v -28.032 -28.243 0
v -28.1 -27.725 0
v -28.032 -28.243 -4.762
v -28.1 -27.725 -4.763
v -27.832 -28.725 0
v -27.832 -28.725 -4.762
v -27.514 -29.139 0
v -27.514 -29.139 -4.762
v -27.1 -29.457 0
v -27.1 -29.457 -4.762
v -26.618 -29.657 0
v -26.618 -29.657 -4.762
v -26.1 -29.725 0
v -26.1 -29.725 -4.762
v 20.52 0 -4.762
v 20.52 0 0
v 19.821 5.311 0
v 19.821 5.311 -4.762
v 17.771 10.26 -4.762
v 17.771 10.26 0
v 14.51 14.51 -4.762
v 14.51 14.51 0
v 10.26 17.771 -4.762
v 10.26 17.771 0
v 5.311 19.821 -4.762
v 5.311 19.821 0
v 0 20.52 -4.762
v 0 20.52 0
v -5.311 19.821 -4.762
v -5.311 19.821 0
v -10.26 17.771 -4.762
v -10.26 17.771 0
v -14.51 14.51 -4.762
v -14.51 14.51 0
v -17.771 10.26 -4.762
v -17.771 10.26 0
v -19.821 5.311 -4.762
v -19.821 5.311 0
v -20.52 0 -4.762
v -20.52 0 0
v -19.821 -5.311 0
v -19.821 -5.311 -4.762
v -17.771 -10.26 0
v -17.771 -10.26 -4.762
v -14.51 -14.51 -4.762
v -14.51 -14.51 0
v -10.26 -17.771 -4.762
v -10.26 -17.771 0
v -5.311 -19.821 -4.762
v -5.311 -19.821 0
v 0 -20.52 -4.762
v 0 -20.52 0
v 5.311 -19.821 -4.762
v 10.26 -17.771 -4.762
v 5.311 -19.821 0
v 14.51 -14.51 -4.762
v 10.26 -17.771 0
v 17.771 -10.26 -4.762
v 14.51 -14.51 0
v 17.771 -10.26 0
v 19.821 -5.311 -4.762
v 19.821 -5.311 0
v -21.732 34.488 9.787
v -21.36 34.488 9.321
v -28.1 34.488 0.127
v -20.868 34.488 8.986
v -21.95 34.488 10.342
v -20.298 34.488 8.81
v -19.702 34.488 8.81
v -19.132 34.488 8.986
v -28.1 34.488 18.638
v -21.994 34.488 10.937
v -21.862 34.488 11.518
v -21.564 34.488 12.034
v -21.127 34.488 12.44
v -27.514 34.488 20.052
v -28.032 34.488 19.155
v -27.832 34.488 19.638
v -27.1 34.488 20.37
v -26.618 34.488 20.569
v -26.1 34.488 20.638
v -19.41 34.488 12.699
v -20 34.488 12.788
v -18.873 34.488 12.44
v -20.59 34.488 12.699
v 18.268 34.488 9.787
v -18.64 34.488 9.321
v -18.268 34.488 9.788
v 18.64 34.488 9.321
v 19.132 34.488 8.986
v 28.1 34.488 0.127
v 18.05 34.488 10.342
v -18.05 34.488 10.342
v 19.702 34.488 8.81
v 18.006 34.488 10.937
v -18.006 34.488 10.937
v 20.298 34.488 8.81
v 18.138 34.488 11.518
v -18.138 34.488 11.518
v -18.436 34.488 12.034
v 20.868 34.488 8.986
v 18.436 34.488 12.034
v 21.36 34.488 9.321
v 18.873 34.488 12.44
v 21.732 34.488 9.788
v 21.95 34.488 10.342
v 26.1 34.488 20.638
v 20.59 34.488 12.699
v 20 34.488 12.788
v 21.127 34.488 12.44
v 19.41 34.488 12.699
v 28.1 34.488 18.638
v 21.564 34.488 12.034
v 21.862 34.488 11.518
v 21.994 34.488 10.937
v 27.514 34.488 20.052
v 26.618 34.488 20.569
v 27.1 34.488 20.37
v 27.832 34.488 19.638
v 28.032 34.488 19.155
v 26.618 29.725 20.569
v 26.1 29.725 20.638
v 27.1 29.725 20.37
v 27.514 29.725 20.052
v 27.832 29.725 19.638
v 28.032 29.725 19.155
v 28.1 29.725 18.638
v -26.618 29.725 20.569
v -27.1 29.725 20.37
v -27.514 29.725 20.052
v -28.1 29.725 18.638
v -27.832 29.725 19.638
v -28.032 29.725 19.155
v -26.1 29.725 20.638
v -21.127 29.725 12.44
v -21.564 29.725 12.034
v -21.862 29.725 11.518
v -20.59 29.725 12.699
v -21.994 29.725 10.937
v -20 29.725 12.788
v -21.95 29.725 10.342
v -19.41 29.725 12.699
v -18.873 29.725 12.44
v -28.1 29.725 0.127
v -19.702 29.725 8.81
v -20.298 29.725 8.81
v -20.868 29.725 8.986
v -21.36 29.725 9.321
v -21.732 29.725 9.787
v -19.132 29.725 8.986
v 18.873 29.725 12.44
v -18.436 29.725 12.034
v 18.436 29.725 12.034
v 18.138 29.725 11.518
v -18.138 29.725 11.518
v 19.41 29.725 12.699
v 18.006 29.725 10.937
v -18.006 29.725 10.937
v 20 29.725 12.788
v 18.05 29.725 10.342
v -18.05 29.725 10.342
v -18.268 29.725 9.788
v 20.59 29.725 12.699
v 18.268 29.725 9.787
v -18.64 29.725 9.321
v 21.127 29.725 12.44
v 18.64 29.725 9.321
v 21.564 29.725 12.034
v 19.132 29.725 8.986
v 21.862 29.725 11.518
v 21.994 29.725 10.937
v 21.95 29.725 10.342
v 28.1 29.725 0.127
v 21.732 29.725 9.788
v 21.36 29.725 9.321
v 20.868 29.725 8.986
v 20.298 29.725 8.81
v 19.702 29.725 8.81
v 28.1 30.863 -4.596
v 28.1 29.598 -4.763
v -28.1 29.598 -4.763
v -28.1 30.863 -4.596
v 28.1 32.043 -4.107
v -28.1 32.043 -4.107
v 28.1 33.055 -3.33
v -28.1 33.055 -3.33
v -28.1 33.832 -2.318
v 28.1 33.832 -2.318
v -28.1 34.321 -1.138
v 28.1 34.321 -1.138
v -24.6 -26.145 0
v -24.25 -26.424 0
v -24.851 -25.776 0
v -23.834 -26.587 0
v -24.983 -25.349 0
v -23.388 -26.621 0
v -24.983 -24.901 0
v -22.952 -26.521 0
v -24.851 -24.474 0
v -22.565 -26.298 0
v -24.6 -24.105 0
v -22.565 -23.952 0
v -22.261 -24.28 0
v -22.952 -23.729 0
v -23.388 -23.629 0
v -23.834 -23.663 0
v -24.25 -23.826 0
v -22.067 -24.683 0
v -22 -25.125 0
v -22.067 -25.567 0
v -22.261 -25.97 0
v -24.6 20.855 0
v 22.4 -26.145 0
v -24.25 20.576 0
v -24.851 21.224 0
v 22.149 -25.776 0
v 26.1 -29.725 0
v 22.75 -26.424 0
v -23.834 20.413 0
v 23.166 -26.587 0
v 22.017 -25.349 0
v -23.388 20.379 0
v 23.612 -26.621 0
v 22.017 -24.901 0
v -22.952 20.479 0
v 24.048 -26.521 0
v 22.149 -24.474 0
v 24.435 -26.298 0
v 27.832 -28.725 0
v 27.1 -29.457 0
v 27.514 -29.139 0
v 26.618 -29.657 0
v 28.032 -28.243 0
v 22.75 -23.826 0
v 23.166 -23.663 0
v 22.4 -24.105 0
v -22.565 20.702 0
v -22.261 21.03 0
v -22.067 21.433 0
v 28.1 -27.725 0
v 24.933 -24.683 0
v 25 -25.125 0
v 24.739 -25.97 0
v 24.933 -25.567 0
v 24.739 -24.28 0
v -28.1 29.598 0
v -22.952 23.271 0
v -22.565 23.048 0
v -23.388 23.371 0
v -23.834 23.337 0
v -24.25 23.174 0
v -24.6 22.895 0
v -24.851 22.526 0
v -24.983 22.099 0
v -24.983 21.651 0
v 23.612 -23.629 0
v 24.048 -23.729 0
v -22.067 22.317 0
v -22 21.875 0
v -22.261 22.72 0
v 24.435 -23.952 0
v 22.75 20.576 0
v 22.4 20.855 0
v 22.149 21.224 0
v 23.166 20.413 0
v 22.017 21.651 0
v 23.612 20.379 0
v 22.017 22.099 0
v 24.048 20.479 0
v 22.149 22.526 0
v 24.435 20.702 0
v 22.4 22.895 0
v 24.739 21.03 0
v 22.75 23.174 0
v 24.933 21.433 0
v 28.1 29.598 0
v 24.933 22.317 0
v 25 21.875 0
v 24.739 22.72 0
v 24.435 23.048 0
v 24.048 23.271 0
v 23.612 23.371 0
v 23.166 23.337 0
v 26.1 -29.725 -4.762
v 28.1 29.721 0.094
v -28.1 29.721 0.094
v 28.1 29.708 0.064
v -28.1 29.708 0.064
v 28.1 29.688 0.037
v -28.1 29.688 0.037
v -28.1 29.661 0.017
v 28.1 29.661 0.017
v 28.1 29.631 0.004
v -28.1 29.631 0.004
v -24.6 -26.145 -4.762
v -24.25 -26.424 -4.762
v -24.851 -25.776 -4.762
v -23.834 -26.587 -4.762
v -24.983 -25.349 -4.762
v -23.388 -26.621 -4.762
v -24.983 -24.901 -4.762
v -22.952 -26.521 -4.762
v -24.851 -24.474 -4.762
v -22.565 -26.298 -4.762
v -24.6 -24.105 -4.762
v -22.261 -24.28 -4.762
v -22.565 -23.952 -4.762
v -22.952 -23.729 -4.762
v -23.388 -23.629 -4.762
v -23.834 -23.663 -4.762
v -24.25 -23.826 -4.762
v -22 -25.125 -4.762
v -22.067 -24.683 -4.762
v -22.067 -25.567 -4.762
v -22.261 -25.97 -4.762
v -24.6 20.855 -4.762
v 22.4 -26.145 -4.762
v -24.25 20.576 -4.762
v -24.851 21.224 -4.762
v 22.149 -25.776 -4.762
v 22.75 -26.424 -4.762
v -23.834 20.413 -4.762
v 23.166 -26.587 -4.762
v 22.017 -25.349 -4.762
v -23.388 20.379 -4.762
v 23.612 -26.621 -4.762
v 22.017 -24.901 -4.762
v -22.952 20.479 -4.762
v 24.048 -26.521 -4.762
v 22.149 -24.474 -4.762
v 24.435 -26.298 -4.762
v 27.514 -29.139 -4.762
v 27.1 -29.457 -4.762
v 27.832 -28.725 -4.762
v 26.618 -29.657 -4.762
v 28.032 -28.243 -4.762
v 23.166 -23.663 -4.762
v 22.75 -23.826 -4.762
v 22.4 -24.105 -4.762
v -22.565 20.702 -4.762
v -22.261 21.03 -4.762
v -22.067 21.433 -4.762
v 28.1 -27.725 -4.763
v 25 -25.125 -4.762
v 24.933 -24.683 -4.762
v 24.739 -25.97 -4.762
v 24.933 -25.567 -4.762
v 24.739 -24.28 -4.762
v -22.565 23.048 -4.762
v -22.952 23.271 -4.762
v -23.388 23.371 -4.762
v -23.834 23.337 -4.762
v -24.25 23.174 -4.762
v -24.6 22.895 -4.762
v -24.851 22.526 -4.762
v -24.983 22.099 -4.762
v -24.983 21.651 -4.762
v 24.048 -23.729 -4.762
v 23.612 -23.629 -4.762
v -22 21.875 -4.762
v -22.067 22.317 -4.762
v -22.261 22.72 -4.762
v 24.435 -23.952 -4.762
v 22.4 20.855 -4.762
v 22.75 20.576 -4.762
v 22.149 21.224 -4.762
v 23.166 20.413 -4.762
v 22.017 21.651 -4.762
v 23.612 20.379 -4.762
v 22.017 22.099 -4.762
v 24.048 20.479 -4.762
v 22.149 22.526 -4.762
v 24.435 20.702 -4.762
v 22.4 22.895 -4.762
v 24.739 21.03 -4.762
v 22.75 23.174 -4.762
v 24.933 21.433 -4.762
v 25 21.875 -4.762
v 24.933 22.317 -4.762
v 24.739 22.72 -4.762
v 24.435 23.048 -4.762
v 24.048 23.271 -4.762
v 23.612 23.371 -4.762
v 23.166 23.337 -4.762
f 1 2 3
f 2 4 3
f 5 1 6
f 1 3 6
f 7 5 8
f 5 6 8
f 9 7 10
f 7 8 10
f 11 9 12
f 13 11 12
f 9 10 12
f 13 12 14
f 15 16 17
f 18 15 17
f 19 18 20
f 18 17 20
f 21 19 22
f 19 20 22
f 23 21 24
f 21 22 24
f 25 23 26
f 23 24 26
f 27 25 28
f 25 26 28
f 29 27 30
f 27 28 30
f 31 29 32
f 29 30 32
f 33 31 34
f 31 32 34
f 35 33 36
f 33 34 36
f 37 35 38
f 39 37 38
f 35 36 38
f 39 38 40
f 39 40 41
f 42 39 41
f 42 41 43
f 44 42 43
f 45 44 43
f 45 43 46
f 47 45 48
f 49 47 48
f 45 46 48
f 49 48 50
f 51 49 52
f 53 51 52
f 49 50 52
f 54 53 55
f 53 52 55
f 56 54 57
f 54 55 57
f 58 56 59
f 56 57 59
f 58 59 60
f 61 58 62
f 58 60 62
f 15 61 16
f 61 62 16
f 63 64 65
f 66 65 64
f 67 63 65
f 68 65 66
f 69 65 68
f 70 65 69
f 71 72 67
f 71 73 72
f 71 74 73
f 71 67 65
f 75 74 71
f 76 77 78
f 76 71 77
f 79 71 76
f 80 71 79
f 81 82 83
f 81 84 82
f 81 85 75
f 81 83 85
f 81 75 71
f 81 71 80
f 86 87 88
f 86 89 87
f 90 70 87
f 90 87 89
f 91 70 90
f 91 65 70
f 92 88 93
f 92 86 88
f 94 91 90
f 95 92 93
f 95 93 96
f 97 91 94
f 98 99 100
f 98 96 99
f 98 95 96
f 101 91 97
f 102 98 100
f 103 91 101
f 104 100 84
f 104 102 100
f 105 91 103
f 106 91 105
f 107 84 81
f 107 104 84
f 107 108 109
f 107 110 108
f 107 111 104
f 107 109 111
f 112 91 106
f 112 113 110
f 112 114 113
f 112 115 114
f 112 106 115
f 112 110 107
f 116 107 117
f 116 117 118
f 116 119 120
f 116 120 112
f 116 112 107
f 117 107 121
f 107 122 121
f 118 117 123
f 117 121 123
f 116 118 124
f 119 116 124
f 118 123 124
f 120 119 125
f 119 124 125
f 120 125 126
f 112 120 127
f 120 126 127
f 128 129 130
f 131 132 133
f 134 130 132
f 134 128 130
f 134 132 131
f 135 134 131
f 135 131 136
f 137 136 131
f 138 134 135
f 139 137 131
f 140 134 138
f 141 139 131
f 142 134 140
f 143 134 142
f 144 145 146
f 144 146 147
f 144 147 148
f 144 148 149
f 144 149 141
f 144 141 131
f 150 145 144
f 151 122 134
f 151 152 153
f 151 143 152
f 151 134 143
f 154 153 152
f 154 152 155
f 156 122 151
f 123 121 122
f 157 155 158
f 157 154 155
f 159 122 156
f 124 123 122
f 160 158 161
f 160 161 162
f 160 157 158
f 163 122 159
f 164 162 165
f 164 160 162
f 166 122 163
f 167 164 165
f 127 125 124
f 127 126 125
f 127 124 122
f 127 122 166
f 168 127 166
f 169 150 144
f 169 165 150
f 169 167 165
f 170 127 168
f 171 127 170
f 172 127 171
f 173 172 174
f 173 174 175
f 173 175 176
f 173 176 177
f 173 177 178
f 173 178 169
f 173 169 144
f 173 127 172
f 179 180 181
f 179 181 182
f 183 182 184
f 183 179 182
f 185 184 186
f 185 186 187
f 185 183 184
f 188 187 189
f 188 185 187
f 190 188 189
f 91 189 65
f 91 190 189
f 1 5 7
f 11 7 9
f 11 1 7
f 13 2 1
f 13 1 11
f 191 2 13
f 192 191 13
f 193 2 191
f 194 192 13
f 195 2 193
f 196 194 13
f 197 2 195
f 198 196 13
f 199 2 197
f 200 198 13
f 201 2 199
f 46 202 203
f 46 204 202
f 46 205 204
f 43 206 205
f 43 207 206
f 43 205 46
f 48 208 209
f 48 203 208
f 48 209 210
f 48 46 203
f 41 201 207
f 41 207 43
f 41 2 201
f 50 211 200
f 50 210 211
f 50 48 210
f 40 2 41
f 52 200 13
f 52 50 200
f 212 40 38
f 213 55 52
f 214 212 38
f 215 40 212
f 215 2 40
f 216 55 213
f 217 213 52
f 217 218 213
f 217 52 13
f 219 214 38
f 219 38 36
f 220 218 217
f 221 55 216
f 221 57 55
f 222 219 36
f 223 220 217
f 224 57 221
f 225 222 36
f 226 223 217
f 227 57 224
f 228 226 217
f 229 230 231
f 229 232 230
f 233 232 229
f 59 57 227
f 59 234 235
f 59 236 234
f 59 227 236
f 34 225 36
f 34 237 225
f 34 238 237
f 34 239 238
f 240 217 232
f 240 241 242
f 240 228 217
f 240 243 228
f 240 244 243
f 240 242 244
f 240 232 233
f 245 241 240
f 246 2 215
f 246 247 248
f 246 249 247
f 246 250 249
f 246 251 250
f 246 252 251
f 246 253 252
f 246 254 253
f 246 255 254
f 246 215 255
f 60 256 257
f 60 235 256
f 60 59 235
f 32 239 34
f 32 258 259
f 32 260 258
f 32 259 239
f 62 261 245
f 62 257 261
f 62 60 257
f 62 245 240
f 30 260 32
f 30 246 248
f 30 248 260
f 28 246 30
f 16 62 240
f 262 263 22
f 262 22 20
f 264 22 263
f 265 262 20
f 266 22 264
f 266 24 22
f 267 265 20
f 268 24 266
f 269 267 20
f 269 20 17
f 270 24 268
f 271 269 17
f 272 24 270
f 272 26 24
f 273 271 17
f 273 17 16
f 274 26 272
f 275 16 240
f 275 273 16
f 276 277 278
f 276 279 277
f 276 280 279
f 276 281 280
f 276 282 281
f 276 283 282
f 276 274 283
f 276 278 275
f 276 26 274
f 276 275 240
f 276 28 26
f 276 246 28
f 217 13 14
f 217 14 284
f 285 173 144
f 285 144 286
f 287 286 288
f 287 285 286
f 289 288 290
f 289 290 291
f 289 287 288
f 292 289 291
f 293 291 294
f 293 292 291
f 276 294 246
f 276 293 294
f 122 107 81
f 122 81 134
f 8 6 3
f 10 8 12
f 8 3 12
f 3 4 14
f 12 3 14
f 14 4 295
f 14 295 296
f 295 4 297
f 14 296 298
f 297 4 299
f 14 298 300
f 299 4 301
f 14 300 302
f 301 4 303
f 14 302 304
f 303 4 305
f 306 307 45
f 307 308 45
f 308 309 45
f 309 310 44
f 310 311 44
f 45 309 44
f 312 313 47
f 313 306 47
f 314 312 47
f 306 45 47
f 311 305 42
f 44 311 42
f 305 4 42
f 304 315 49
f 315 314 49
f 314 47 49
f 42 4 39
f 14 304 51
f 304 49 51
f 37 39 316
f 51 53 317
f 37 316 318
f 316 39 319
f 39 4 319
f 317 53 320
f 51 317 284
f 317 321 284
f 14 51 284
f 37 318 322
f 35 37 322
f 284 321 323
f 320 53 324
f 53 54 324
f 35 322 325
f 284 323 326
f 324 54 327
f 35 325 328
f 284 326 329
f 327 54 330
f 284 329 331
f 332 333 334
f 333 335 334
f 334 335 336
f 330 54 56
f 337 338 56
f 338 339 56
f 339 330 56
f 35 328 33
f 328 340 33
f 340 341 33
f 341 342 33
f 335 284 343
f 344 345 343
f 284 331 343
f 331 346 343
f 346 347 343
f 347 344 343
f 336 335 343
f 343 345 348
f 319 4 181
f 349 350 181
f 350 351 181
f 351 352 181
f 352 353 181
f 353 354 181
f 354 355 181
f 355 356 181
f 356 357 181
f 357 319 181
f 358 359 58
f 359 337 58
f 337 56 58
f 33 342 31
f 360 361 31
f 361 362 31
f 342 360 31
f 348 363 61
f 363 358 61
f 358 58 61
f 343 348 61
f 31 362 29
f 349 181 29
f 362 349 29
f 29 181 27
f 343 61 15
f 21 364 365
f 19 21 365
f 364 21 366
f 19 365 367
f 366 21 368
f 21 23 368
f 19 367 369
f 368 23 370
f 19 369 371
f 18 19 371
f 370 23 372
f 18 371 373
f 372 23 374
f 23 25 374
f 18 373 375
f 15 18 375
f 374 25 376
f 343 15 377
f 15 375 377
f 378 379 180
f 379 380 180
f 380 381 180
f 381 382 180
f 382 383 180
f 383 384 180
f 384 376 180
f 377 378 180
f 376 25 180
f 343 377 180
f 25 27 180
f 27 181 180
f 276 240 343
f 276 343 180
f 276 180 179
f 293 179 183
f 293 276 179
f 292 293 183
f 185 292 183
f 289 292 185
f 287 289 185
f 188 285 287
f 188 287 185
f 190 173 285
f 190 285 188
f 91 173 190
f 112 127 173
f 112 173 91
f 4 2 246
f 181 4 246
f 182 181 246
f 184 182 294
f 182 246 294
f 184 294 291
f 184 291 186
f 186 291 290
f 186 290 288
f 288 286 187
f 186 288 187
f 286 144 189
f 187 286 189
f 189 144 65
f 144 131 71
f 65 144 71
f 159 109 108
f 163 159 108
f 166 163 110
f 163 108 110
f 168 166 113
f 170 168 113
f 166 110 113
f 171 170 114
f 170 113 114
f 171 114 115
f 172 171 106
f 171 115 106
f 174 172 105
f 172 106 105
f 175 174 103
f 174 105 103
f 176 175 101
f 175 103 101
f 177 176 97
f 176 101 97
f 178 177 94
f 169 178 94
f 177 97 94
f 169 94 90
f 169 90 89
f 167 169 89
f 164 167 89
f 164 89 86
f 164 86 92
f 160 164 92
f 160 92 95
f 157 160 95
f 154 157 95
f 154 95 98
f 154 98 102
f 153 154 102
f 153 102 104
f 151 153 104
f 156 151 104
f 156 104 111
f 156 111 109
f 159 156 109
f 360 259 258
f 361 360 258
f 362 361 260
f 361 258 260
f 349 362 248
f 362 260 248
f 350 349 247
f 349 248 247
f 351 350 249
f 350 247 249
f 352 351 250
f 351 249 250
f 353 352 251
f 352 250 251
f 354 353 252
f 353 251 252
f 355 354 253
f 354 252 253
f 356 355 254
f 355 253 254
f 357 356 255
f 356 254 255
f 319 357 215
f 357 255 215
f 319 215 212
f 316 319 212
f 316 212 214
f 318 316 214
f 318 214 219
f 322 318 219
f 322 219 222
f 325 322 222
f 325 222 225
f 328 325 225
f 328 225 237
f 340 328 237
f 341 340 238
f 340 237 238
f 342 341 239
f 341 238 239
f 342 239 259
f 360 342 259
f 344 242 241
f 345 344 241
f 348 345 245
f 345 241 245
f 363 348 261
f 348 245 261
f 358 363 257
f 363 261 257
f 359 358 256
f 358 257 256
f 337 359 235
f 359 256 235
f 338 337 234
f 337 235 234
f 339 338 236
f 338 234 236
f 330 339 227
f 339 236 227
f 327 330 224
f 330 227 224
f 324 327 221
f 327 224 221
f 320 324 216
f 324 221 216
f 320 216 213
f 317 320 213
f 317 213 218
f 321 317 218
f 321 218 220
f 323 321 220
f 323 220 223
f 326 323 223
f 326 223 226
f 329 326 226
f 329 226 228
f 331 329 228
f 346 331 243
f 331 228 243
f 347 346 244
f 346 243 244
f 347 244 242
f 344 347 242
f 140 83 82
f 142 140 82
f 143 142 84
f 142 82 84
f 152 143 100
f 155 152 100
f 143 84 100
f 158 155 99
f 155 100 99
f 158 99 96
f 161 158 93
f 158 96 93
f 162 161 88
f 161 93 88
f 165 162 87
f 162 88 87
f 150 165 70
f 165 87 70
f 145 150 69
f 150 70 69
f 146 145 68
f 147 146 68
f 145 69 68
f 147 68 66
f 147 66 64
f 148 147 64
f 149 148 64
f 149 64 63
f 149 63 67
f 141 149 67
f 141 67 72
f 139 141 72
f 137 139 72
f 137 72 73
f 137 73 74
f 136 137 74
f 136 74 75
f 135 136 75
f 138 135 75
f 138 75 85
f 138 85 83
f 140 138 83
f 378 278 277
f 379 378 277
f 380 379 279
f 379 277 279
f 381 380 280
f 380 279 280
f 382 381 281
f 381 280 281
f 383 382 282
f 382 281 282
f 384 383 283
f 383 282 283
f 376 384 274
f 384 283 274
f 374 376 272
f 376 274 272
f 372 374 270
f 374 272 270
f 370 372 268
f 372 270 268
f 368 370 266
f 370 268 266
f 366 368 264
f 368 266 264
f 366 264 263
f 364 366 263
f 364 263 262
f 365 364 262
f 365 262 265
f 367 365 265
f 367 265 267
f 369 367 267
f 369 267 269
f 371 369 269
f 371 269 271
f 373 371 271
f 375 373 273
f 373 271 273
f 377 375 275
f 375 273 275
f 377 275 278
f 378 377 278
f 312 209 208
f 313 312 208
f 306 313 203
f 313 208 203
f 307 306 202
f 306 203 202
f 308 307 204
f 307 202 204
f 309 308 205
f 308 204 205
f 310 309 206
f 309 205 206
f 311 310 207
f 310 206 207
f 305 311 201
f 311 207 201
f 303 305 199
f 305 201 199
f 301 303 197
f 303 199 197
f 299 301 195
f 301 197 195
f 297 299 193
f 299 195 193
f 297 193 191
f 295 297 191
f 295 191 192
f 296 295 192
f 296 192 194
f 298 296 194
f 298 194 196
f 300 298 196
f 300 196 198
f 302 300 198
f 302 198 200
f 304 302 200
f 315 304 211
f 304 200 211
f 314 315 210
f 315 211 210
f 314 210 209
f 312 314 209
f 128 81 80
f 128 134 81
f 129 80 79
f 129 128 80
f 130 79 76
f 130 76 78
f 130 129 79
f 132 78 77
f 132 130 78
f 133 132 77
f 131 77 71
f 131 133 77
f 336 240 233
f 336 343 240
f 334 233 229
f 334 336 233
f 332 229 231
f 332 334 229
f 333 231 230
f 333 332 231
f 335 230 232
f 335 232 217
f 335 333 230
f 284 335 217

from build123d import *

# Parameters (mm, degrees)
SKETCH1_W                    = 56.2
SKETCH1_H                    = 59.45
SKETCH1_R                    = 20.52
SKETCH1_R_2                  = 1.5
BASE_FLANGE1_DEPTH           = 4.7625
EDGE_FLANGE1_STRIP_W         = 19.304
EDGE_FLANGE1_STRIP_H         = 4.7625
EDGE_FLANGE1_STRIP_CUT_DEPTH = 56.2
EDGE_FLANGE1_DEPTH           = 56.2
FILLET1_R                    = 2
CUT_EXTRUDE1_REACH           = 75.067
SKETCH11_R                   = 2


# Sheet-metal steps are written as plain solids
with BuildPart() as part:
    # Sketch1 → Base-Flange1 (new body)
    with BuildSketch(Plane.XY):
        Rectangle(SKETCH1_W, SKETCH1_H)
        Circle(SKETCH1_R, mode=Mode.SUBTRACT)
        with Locations((-23.5, 21.874999952)):
            Circle(SKETCH1_R_2, mode=Mode.SUBTRACT)
        with Locations((23.5, 21.874999952)):
            Circle(SKETCH1_R_2, mode=Mode.SUBTRACT)
        with Locations((-23.5, -25.125)):
            Circle(SKETCH1_R_2, mode=Mode.SUBTRACT)
        with Locations((23.5, -25.125)):
            Circle(SKETCH1_R_2, mode=Mode.SUBTRACT)
    extrude(amount=-BASE_FLANGE1_DEPTH)

    # Edge-Flange1 strip (across the edge) → Edge-Flange1 strip cut (cut)
    with BuildSketch(Plane(origin=(28.1, 29.725, 0), x_dir=(0, -1, 0), z_dir=(-1, 0, 0))):
        with Locations((-9.525, -2.38125)):
            Rectangle(EDGE_FLANGE1_STRIP_W, EDGE_FLANGE1_STRIP_H)
    extrude(amount=EDGE_FLANGE1_STRIP_CUT_DEPTH, mode=Mode.SUBTRACT)

    # Edge-Flange1 section (across the edge) → Edge-Flange1 (add)
    with BuildSketch(Plane(origin=(28.1, 29.725, 0), x_dir=(0, -1, 0), z_dir=(-1, 0, 0))):
        with BuildLine():
            Line((-4.7625, 0.127), (-4.7625, 20.6375))
            Line((-4.7625, 20.6375), (0, 20.6375))
            Line((0, 20.6375), (0, 0.127))
            ThreePointArc((0, 0.127), (0.037197439, 0.037197439), (0.127, 0))
            Line((0.127, 0), (0.127, -4.7625))
            ThreePointArc((0.127, -4.7625), (-3.330398607, -3.330398607), (-4.7625, 0.127))
        make_face()
    extrude(amount=EDGE_FLANGE1_DEPTH)

    # Fillet1
    fillet1_edges = [part.edges().sort_by_distance(p)[0] for p in [
        (28.1, 32.10625, 20.6375),
        (-28.1, 32.10625, 20.6375),
        (28.1, -29.725, -2.38125),
        (-28.1, -29.725, -2.38125),
    ]]
    fillet(fillet1_edges, radius=FILLET1_R)

    # Sketch11 → Cut-Extrude1 (cut, up to next)
    with BuildSketch(Plane(origin=(0, 34.4875, 0), x_dir=(1, 0, 0), z_dir=(0, 1, 0)), mode=Mode.PRIVATE) as cut_extrude1_sk1:
        with Locations(Location((-20, -10.7875, 0), (0, 0, 270))):
            Circle(SKETCH11_R)
    cut_extrude1_tool1 = extrude(cut_extrude1_sk1.sketch, amount=-CUT_EXTRUDE1_REACH, mode=Mode.PRIVATE) & part.part
    # Sketch11 → Cut-Extrude1 (cut, up to next)
    with BuildSketch(Plane(origin=(0, 34.4875, 0), x_dir=(1, 0, 0), z_dir=(0, 1, 0)), mode=Mode.PRIVATE) as cut_extrude1_sk2:
        with Locations(Location((20, -10.7875, 0), (0, 0, 270))):
            Circle(SKETCH11_R)
    cut_extrude1_tool2 = extrude(cut_extrude1_sk2.sketch, amount=-CUT_EXTRUDE1_REACH, mode=Mode.PRIVATE) & part.part
    add(cut_extrude1_tool1.solids().sort_by_distance((-20, 34.4875, 10.7875))[0], mode=Mode.SUBTRACT)
    add(cut_extrude1_tool2.solids().sort_by_distance((20, 34.4875, 10.7875))[0], mode=Mode.SUBTRACT)


solid = part.part
